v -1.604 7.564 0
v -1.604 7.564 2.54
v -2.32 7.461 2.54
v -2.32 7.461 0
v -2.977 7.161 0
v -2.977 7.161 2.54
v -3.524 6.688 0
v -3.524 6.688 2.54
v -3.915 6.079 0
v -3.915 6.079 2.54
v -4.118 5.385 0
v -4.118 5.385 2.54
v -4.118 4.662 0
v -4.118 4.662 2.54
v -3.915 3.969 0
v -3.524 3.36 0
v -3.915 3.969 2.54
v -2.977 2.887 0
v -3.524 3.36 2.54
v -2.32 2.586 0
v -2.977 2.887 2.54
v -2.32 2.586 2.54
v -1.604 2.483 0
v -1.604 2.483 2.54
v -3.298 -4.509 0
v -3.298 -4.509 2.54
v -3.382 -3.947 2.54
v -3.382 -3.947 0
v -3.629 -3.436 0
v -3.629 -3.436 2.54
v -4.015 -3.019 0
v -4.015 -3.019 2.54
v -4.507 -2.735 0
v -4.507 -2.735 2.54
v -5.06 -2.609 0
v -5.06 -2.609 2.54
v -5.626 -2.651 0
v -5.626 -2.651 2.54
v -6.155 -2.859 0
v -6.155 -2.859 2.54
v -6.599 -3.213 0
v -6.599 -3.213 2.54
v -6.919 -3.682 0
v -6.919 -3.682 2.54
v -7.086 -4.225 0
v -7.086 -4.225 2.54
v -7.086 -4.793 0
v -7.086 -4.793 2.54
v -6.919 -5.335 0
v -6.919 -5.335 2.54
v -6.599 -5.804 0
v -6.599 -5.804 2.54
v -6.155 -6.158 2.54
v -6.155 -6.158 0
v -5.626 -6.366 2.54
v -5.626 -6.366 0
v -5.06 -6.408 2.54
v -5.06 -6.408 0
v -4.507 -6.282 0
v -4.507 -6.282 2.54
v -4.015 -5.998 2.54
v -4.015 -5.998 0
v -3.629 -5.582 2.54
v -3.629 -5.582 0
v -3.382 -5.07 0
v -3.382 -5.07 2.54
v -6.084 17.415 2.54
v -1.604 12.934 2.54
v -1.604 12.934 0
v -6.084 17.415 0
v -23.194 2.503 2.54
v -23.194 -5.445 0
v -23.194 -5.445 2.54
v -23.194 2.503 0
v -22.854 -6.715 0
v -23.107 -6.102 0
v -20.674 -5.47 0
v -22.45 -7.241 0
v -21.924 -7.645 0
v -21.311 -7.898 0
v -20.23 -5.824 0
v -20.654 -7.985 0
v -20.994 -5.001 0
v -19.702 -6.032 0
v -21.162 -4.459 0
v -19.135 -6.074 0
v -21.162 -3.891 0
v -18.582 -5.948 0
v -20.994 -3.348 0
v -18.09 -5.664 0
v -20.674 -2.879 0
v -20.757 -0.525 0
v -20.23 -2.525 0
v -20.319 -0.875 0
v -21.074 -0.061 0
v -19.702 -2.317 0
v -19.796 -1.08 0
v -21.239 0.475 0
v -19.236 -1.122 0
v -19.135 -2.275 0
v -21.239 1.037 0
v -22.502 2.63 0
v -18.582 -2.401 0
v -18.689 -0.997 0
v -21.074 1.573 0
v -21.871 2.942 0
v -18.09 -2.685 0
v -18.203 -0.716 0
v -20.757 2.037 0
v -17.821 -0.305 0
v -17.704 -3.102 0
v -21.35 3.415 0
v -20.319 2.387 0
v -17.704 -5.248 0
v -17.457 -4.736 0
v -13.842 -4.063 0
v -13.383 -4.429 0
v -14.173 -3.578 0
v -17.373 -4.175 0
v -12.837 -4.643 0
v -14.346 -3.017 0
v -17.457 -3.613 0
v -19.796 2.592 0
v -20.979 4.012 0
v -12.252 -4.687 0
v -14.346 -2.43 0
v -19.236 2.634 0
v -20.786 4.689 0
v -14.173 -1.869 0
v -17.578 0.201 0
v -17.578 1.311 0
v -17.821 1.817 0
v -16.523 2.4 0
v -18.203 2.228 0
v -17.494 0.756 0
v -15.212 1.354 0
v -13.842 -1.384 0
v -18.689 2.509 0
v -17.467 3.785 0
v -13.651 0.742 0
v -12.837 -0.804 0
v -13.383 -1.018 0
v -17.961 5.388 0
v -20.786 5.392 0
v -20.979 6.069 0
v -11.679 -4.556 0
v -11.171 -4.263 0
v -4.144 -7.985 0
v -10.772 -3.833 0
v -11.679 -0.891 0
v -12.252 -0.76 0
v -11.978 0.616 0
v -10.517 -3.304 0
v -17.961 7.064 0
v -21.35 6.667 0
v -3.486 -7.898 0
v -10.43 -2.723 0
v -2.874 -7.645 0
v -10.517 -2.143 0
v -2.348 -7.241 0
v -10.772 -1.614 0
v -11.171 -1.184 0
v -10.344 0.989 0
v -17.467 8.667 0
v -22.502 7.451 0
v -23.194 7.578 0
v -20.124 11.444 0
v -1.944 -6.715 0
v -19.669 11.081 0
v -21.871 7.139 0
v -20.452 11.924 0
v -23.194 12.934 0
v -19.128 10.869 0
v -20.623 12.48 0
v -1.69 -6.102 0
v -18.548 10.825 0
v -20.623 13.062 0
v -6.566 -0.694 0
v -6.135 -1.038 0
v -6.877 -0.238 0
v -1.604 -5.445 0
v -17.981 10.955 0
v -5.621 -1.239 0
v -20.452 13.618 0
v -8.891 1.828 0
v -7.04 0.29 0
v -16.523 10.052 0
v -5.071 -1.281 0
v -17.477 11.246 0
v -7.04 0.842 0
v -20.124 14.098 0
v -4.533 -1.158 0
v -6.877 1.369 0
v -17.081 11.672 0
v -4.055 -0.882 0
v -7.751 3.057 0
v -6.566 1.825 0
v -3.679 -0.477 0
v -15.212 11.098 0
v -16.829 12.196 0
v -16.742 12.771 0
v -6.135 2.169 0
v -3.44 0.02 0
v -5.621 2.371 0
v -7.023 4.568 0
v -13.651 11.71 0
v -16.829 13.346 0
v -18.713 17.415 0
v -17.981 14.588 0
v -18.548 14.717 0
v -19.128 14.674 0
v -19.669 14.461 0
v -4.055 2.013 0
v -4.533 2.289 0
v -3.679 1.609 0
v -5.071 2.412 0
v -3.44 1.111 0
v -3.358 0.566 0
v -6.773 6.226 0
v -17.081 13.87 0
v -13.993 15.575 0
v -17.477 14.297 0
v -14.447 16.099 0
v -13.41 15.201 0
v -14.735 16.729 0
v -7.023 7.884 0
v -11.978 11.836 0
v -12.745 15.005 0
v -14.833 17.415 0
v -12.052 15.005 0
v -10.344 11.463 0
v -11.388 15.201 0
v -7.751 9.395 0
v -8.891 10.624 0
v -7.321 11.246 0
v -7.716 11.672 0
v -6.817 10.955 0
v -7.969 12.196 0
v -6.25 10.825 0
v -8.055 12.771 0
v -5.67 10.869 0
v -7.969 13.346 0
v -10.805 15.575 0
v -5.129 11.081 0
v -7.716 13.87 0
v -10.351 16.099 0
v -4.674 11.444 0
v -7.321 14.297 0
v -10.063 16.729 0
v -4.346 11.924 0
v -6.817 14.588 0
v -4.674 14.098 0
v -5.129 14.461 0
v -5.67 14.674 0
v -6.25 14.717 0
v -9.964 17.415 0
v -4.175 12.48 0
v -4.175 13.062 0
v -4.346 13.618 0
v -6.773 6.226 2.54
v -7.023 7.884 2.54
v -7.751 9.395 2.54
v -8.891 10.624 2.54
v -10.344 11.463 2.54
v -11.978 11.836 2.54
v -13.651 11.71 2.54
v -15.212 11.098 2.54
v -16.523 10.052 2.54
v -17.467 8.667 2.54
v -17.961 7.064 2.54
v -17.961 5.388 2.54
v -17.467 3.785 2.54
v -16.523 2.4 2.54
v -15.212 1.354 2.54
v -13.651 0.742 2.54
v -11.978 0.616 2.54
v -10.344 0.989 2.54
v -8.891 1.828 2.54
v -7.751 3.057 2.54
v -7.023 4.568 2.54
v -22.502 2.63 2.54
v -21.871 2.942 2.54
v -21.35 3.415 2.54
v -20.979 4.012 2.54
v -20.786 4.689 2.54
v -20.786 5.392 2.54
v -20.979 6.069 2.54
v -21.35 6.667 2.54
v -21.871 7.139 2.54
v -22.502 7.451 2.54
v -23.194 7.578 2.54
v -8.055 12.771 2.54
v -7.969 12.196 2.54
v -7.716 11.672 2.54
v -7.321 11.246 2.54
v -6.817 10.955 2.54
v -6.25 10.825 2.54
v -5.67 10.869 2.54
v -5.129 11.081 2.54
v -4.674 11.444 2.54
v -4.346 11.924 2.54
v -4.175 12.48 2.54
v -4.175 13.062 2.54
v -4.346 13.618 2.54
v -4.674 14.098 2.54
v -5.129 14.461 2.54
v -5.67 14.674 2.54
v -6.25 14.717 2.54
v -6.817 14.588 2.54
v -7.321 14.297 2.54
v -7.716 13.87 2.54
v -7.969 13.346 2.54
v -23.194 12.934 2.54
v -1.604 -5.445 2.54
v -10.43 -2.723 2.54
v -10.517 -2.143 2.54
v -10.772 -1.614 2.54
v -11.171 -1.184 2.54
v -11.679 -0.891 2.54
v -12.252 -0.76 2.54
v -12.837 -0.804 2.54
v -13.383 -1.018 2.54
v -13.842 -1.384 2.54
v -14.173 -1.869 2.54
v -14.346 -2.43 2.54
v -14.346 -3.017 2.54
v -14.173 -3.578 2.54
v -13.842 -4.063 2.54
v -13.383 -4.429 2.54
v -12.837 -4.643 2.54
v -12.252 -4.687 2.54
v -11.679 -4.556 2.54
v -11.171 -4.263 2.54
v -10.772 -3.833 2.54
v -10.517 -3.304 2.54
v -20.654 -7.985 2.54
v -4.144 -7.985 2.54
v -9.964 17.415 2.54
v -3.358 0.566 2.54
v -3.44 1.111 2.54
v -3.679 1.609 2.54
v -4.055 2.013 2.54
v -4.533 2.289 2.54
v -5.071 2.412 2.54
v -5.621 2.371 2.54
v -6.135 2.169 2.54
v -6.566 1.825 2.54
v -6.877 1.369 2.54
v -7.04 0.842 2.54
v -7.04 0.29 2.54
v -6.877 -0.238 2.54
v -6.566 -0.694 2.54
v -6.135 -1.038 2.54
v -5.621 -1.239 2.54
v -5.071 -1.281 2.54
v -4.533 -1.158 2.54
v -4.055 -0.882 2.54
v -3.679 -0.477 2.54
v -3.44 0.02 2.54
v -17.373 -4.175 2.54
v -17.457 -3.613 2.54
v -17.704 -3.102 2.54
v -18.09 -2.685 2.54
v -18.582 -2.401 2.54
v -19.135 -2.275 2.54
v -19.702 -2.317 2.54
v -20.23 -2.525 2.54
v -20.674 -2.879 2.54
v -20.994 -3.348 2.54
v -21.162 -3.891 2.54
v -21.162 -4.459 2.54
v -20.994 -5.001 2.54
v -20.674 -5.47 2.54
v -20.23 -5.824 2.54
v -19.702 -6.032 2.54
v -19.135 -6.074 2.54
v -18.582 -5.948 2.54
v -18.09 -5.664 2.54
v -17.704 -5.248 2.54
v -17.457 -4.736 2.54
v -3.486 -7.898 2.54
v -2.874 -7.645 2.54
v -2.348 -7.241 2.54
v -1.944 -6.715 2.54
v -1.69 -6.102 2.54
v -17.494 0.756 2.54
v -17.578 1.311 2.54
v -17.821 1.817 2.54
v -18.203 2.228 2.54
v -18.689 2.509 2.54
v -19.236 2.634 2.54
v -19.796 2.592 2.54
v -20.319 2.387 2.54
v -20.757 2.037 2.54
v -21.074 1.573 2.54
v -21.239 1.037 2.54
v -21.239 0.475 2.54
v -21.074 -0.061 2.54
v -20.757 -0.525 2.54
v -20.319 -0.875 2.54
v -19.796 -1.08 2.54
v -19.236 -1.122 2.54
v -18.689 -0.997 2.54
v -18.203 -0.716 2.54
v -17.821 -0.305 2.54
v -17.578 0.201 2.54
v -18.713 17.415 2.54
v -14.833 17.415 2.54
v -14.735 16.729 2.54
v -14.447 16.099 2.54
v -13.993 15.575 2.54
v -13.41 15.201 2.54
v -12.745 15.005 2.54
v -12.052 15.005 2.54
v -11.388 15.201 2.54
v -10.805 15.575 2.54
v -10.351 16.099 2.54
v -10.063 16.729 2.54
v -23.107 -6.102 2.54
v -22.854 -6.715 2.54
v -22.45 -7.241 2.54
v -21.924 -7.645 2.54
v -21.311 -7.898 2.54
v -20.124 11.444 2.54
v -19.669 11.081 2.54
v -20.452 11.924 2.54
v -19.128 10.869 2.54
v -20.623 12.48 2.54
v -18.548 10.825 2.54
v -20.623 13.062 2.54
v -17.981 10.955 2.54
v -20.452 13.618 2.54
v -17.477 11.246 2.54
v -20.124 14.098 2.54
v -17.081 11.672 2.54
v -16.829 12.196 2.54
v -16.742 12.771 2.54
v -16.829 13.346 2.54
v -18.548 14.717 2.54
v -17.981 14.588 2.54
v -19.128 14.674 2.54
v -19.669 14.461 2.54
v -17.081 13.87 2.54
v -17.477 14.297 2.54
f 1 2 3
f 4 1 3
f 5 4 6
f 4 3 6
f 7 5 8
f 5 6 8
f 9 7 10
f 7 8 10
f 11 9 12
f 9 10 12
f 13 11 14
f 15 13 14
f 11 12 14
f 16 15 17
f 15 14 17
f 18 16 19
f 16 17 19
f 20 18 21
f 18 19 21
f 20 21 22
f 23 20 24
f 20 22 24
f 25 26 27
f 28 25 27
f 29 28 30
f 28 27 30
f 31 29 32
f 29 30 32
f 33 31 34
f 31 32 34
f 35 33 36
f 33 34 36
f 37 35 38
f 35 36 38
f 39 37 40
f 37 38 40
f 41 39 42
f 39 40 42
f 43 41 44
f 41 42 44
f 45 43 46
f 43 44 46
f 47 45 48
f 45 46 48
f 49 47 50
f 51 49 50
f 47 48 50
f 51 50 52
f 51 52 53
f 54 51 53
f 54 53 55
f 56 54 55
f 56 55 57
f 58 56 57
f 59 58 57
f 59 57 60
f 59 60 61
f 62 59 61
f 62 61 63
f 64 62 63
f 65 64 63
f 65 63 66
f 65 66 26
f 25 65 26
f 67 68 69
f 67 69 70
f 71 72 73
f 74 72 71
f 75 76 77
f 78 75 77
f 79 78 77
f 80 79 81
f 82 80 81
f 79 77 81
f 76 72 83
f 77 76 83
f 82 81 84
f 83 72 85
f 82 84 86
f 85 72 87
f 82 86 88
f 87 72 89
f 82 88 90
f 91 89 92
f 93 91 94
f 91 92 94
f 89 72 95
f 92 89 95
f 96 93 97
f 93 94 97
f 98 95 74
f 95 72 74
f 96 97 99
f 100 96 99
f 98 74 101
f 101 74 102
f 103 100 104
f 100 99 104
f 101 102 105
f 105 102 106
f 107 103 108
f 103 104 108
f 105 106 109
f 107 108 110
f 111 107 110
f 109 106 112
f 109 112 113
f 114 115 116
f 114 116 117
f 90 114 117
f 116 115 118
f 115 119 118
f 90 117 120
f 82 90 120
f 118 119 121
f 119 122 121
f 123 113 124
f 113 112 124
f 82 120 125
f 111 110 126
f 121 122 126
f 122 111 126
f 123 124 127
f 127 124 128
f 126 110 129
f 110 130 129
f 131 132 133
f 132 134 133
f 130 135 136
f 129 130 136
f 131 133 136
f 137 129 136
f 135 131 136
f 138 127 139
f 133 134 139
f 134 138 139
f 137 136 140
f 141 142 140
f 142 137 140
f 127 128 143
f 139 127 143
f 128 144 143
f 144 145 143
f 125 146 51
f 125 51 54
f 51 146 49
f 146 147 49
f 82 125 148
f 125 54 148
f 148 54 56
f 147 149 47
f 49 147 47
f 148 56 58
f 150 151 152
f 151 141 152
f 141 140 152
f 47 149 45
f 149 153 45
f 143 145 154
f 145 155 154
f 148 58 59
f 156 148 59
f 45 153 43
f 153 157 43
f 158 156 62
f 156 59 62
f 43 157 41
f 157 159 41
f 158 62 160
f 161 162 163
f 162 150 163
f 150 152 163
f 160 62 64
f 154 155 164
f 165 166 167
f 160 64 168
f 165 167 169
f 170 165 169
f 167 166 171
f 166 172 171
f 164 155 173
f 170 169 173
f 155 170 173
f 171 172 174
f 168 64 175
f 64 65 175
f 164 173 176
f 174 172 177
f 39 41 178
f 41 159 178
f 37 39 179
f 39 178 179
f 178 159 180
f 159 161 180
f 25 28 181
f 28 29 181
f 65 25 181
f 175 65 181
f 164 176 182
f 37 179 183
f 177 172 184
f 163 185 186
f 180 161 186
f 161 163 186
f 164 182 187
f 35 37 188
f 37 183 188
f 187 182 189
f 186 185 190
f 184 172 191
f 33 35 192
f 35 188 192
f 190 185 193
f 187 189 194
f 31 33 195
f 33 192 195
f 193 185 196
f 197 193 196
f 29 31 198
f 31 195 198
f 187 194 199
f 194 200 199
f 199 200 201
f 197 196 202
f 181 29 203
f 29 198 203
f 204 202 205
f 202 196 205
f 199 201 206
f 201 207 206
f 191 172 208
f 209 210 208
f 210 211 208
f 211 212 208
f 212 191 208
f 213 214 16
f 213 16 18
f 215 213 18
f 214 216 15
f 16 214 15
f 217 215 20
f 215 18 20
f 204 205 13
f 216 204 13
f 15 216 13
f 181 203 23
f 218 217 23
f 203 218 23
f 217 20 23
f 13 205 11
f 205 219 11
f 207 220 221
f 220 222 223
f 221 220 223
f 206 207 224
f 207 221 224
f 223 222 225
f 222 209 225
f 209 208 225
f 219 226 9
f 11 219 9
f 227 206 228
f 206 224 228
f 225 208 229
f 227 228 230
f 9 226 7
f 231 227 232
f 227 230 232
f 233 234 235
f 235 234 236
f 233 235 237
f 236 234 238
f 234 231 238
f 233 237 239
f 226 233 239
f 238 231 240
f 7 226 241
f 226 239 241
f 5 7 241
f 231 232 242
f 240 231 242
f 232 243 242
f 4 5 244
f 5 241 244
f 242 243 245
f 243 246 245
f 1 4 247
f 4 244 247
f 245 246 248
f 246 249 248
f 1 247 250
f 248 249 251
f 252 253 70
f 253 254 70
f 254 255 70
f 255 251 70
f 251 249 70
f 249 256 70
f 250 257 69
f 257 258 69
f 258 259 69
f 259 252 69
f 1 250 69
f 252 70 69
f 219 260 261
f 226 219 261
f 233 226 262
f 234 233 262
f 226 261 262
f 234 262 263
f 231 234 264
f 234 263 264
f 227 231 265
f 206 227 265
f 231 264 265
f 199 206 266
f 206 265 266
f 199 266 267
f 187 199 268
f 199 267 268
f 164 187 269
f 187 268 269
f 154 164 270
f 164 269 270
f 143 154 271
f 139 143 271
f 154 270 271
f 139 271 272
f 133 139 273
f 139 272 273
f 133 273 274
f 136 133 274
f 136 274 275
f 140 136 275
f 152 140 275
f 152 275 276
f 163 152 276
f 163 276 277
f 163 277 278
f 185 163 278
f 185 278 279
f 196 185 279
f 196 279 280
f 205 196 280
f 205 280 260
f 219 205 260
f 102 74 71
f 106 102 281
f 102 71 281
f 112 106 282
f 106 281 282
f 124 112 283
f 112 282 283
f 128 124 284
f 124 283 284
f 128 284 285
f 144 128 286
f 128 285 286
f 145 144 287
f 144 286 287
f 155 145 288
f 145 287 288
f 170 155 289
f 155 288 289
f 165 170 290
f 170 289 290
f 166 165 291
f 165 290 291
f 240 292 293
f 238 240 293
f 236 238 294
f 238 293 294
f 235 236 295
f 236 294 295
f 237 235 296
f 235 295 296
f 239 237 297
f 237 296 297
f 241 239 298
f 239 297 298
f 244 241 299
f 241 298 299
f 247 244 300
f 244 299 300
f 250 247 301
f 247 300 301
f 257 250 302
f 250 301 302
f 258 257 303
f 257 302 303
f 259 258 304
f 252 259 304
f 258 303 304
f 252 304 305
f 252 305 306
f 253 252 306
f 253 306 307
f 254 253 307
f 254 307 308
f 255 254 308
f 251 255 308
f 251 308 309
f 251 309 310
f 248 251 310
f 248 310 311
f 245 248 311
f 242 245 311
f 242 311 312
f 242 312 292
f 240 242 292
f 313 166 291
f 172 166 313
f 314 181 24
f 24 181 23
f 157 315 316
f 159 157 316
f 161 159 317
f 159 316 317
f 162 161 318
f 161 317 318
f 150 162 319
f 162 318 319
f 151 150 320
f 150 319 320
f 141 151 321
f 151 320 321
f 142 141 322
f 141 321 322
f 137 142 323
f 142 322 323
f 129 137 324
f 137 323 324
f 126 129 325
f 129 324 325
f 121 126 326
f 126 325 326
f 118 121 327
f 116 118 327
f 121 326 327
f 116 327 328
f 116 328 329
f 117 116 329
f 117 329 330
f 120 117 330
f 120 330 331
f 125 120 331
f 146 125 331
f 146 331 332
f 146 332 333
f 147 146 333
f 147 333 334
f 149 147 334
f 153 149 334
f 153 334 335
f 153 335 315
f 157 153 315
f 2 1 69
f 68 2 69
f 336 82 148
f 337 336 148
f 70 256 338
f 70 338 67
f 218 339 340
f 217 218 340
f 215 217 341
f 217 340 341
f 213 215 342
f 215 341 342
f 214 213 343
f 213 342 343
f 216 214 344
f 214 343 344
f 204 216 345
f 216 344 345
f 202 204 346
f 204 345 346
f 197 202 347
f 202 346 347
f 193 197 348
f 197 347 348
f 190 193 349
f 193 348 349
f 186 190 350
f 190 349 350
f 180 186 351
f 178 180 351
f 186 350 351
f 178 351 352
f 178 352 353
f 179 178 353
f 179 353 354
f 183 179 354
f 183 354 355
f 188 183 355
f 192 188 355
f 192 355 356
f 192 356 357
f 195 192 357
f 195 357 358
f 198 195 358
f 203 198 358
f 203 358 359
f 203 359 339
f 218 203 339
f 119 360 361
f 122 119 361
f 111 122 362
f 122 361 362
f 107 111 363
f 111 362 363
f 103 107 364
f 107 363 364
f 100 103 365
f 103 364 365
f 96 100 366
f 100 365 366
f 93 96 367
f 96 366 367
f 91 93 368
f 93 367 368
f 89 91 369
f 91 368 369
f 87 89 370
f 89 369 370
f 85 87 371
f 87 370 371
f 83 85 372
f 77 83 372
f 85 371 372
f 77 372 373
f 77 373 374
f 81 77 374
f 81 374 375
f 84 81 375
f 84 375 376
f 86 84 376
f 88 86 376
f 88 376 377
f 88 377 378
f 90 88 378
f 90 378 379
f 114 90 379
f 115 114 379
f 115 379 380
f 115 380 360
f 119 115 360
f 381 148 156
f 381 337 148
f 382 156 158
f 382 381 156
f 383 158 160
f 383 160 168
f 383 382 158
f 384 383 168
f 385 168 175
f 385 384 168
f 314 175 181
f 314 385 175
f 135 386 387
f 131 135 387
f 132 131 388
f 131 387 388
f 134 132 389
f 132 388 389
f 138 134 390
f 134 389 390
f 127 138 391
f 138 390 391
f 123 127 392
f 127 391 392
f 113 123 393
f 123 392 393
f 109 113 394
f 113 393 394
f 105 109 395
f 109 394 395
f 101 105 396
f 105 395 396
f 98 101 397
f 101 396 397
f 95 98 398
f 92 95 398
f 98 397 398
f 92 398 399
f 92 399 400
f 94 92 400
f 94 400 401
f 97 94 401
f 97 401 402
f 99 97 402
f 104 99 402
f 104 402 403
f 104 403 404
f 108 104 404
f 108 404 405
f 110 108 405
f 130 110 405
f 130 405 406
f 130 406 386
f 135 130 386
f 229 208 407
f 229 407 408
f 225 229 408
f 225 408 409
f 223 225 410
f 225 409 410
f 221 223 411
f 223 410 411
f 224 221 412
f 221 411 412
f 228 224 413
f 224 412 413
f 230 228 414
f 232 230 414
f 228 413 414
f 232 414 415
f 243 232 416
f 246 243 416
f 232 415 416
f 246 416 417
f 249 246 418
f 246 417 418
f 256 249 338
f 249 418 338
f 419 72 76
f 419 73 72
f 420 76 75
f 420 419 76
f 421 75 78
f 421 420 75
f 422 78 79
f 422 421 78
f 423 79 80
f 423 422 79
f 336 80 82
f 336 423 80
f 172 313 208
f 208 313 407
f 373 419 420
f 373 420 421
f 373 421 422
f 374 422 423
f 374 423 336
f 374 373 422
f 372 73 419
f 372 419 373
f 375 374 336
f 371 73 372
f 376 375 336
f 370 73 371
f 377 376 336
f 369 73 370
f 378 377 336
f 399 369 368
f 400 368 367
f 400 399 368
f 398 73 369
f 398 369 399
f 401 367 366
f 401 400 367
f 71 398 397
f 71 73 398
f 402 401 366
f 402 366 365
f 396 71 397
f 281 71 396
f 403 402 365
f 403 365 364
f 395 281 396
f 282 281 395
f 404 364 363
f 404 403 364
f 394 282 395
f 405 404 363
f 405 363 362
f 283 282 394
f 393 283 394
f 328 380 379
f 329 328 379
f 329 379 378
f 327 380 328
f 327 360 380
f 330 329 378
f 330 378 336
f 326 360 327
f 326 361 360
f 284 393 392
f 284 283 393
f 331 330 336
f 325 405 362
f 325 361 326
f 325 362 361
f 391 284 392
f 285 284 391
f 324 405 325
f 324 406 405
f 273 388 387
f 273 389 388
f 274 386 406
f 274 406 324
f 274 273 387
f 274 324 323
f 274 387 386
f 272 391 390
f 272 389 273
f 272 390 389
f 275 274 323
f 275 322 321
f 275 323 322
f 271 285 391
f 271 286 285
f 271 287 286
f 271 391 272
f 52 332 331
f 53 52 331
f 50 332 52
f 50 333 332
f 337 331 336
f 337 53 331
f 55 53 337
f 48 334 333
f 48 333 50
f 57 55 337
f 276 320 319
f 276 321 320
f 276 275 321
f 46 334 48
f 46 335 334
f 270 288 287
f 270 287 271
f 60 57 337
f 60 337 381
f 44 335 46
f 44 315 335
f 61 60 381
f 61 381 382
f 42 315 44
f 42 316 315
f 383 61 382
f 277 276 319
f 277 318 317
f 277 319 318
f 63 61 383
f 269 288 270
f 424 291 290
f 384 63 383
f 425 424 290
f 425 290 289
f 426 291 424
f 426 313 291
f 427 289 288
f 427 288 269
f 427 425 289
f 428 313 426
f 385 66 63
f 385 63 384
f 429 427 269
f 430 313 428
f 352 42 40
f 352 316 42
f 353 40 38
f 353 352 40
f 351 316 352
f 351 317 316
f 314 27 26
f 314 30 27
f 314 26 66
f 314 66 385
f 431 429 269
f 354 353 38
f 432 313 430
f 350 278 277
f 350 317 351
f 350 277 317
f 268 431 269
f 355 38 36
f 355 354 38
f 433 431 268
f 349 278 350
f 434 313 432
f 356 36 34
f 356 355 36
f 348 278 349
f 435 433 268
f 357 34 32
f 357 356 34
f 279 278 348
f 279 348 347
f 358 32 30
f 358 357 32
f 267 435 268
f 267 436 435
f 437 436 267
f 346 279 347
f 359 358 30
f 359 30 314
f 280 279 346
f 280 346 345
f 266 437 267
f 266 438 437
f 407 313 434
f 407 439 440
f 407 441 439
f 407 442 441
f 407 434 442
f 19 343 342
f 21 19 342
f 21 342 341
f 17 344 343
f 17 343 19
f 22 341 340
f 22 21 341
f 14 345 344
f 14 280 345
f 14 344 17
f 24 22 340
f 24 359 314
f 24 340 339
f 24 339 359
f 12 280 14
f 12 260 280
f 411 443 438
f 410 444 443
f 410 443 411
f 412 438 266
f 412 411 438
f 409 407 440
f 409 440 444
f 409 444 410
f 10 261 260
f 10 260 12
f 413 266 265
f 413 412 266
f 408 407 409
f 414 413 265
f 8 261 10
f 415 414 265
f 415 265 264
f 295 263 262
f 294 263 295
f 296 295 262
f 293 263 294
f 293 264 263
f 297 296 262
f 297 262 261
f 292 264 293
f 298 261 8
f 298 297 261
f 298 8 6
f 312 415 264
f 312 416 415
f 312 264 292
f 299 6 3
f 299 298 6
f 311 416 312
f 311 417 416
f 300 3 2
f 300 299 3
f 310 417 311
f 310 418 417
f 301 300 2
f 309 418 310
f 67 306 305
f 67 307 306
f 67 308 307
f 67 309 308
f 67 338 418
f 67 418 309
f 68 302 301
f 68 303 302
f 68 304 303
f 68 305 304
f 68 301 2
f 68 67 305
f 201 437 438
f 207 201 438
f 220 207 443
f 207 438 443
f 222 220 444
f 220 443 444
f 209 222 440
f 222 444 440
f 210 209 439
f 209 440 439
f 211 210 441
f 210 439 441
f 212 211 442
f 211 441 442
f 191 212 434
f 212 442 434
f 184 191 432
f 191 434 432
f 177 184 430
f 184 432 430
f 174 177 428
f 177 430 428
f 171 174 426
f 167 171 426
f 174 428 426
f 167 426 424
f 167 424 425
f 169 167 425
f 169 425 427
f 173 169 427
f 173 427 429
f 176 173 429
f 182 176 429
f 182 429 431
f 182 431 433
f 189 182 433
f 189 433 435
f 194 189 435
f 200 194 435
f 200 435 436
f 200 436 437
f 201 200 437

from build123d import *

# Parameters (mm, degrees)
SKETCH1_W           = 21.59
SKETCH1_H           = 25.4
BOSS_EXTRUDE1_DEPTH = 2.54
FILLET1_R           = 2.54
CUT_EXTRUDE1_DEPTH  = 30.115049214
SKETCH3_R           = 5.625489831
SKETCH3_R_2         = 2.54
SKETCH3_R_3         = 2.540453657
SKETCH3_R_4         = 1.951297309
SKETCH3_R_5         = 2.434341389
SKETCH3_R_6         = 1.968933299
SKETCH3_R_7         = 1.905
CUT_EXTRUDE2_DEPTH  = 30.115049214
SKETCH4_R           = 1.851487323
SKETCH4_R_2         = 1.882954115
CUT_EXTRUDE3_DEPTH  = 30.115049214


with BuildPart() as part:
    # Sketch1 → Boss-Extrude1 (new body)
    with BuildSketch(Plane.XY):
        with Locations((-12.398804361, 4.71499153)):
            Rectangle(SKETCH1_W, SKETCH1_H)
    extrude(amount=BOSS_EXTRUDE1_DEPTH)

    # Fillet1
    fillet1_edges = [part.edges().sort_by_distance(p)[0] for p in [
        (-23.193804361, -7.98500847, 1.27),
        (-1.603804361, -7.98500847, 1.27),
    ]]
    fillet(fillet1_edges, radius=FILLET1_R)

    # Sketch2 → Cut-Extrude1 (cut, through all)
    with BuildSketch(Plane.XY.offset(2.54)):
        Polygon((-24.267164586, 11.861079729), (-17.410801404, 18.717442911), (-24.267164586, 18.717442911), align=None)
        Polygon((-7.386807318, 18.717442911), (-0.530444135, 18.717442911), (-0.530444135, 11.861079729), align=None)
    extrude(amount=-CUT_EXTRUDE1_DEPTH, mode=Mode.SUBTRACT)

    # Sketch3 → Cut-Extrude2 (cut, through all)
    with BuildSketch(Plane.XY.offset(2.54)):
        with Locations((-12.398804361, 6.226040262)):
            Circle(SKETCH3_R)
        with Locations((-23.301730566, 5.040576616)):
            Circle(SKETCH3_R_2)
        with Locations((-1.603804361, 5.023879945)):
            Circle(SKETCH3_R_3)
        with Locations((-18.693449352, 12.771135319)):
            Circle(SKETCH3_R_4)
        with Locations((-12.398804361, 17.41499153)):
            Circle(SKETCH3_R_5)
        with Locations(Location((-6.104159369, 12.771135319, 0), (0, 0, 180))):
            Circle(SKETCH3_R_4)
        with Locations((-12.398804361, -2.723375429)):
            Circle(SKETCH3_R_6)
        with Locations((-19.27783284, -4.174711925)):
            Circle(SKETCH3_R_7)
        with Locations((-5.202539132, -4.508645347)):
            Circle(SKETCH3_R_7)
    extrude(amount=-CUT_EXTRUDE2_DEPTH, mode=Mode.SUBTRACT)

    # Sketch4 → Cut-Extrude3 (cut, through all)
    with BuildSketch(Plane.XY.offset(2.54)):
        with Locations((-5.209017976, 0.565757183)):
            Circle(SKETCH4_R)
        with Locations((-19.377050407, 0.75613176)):
            Circle(SKETCH4_R_2)
    extrude(amount=-CUT_EXTRUDE3_DEPTH, mode=Mode.SUBTRACT)


solid = part.part
